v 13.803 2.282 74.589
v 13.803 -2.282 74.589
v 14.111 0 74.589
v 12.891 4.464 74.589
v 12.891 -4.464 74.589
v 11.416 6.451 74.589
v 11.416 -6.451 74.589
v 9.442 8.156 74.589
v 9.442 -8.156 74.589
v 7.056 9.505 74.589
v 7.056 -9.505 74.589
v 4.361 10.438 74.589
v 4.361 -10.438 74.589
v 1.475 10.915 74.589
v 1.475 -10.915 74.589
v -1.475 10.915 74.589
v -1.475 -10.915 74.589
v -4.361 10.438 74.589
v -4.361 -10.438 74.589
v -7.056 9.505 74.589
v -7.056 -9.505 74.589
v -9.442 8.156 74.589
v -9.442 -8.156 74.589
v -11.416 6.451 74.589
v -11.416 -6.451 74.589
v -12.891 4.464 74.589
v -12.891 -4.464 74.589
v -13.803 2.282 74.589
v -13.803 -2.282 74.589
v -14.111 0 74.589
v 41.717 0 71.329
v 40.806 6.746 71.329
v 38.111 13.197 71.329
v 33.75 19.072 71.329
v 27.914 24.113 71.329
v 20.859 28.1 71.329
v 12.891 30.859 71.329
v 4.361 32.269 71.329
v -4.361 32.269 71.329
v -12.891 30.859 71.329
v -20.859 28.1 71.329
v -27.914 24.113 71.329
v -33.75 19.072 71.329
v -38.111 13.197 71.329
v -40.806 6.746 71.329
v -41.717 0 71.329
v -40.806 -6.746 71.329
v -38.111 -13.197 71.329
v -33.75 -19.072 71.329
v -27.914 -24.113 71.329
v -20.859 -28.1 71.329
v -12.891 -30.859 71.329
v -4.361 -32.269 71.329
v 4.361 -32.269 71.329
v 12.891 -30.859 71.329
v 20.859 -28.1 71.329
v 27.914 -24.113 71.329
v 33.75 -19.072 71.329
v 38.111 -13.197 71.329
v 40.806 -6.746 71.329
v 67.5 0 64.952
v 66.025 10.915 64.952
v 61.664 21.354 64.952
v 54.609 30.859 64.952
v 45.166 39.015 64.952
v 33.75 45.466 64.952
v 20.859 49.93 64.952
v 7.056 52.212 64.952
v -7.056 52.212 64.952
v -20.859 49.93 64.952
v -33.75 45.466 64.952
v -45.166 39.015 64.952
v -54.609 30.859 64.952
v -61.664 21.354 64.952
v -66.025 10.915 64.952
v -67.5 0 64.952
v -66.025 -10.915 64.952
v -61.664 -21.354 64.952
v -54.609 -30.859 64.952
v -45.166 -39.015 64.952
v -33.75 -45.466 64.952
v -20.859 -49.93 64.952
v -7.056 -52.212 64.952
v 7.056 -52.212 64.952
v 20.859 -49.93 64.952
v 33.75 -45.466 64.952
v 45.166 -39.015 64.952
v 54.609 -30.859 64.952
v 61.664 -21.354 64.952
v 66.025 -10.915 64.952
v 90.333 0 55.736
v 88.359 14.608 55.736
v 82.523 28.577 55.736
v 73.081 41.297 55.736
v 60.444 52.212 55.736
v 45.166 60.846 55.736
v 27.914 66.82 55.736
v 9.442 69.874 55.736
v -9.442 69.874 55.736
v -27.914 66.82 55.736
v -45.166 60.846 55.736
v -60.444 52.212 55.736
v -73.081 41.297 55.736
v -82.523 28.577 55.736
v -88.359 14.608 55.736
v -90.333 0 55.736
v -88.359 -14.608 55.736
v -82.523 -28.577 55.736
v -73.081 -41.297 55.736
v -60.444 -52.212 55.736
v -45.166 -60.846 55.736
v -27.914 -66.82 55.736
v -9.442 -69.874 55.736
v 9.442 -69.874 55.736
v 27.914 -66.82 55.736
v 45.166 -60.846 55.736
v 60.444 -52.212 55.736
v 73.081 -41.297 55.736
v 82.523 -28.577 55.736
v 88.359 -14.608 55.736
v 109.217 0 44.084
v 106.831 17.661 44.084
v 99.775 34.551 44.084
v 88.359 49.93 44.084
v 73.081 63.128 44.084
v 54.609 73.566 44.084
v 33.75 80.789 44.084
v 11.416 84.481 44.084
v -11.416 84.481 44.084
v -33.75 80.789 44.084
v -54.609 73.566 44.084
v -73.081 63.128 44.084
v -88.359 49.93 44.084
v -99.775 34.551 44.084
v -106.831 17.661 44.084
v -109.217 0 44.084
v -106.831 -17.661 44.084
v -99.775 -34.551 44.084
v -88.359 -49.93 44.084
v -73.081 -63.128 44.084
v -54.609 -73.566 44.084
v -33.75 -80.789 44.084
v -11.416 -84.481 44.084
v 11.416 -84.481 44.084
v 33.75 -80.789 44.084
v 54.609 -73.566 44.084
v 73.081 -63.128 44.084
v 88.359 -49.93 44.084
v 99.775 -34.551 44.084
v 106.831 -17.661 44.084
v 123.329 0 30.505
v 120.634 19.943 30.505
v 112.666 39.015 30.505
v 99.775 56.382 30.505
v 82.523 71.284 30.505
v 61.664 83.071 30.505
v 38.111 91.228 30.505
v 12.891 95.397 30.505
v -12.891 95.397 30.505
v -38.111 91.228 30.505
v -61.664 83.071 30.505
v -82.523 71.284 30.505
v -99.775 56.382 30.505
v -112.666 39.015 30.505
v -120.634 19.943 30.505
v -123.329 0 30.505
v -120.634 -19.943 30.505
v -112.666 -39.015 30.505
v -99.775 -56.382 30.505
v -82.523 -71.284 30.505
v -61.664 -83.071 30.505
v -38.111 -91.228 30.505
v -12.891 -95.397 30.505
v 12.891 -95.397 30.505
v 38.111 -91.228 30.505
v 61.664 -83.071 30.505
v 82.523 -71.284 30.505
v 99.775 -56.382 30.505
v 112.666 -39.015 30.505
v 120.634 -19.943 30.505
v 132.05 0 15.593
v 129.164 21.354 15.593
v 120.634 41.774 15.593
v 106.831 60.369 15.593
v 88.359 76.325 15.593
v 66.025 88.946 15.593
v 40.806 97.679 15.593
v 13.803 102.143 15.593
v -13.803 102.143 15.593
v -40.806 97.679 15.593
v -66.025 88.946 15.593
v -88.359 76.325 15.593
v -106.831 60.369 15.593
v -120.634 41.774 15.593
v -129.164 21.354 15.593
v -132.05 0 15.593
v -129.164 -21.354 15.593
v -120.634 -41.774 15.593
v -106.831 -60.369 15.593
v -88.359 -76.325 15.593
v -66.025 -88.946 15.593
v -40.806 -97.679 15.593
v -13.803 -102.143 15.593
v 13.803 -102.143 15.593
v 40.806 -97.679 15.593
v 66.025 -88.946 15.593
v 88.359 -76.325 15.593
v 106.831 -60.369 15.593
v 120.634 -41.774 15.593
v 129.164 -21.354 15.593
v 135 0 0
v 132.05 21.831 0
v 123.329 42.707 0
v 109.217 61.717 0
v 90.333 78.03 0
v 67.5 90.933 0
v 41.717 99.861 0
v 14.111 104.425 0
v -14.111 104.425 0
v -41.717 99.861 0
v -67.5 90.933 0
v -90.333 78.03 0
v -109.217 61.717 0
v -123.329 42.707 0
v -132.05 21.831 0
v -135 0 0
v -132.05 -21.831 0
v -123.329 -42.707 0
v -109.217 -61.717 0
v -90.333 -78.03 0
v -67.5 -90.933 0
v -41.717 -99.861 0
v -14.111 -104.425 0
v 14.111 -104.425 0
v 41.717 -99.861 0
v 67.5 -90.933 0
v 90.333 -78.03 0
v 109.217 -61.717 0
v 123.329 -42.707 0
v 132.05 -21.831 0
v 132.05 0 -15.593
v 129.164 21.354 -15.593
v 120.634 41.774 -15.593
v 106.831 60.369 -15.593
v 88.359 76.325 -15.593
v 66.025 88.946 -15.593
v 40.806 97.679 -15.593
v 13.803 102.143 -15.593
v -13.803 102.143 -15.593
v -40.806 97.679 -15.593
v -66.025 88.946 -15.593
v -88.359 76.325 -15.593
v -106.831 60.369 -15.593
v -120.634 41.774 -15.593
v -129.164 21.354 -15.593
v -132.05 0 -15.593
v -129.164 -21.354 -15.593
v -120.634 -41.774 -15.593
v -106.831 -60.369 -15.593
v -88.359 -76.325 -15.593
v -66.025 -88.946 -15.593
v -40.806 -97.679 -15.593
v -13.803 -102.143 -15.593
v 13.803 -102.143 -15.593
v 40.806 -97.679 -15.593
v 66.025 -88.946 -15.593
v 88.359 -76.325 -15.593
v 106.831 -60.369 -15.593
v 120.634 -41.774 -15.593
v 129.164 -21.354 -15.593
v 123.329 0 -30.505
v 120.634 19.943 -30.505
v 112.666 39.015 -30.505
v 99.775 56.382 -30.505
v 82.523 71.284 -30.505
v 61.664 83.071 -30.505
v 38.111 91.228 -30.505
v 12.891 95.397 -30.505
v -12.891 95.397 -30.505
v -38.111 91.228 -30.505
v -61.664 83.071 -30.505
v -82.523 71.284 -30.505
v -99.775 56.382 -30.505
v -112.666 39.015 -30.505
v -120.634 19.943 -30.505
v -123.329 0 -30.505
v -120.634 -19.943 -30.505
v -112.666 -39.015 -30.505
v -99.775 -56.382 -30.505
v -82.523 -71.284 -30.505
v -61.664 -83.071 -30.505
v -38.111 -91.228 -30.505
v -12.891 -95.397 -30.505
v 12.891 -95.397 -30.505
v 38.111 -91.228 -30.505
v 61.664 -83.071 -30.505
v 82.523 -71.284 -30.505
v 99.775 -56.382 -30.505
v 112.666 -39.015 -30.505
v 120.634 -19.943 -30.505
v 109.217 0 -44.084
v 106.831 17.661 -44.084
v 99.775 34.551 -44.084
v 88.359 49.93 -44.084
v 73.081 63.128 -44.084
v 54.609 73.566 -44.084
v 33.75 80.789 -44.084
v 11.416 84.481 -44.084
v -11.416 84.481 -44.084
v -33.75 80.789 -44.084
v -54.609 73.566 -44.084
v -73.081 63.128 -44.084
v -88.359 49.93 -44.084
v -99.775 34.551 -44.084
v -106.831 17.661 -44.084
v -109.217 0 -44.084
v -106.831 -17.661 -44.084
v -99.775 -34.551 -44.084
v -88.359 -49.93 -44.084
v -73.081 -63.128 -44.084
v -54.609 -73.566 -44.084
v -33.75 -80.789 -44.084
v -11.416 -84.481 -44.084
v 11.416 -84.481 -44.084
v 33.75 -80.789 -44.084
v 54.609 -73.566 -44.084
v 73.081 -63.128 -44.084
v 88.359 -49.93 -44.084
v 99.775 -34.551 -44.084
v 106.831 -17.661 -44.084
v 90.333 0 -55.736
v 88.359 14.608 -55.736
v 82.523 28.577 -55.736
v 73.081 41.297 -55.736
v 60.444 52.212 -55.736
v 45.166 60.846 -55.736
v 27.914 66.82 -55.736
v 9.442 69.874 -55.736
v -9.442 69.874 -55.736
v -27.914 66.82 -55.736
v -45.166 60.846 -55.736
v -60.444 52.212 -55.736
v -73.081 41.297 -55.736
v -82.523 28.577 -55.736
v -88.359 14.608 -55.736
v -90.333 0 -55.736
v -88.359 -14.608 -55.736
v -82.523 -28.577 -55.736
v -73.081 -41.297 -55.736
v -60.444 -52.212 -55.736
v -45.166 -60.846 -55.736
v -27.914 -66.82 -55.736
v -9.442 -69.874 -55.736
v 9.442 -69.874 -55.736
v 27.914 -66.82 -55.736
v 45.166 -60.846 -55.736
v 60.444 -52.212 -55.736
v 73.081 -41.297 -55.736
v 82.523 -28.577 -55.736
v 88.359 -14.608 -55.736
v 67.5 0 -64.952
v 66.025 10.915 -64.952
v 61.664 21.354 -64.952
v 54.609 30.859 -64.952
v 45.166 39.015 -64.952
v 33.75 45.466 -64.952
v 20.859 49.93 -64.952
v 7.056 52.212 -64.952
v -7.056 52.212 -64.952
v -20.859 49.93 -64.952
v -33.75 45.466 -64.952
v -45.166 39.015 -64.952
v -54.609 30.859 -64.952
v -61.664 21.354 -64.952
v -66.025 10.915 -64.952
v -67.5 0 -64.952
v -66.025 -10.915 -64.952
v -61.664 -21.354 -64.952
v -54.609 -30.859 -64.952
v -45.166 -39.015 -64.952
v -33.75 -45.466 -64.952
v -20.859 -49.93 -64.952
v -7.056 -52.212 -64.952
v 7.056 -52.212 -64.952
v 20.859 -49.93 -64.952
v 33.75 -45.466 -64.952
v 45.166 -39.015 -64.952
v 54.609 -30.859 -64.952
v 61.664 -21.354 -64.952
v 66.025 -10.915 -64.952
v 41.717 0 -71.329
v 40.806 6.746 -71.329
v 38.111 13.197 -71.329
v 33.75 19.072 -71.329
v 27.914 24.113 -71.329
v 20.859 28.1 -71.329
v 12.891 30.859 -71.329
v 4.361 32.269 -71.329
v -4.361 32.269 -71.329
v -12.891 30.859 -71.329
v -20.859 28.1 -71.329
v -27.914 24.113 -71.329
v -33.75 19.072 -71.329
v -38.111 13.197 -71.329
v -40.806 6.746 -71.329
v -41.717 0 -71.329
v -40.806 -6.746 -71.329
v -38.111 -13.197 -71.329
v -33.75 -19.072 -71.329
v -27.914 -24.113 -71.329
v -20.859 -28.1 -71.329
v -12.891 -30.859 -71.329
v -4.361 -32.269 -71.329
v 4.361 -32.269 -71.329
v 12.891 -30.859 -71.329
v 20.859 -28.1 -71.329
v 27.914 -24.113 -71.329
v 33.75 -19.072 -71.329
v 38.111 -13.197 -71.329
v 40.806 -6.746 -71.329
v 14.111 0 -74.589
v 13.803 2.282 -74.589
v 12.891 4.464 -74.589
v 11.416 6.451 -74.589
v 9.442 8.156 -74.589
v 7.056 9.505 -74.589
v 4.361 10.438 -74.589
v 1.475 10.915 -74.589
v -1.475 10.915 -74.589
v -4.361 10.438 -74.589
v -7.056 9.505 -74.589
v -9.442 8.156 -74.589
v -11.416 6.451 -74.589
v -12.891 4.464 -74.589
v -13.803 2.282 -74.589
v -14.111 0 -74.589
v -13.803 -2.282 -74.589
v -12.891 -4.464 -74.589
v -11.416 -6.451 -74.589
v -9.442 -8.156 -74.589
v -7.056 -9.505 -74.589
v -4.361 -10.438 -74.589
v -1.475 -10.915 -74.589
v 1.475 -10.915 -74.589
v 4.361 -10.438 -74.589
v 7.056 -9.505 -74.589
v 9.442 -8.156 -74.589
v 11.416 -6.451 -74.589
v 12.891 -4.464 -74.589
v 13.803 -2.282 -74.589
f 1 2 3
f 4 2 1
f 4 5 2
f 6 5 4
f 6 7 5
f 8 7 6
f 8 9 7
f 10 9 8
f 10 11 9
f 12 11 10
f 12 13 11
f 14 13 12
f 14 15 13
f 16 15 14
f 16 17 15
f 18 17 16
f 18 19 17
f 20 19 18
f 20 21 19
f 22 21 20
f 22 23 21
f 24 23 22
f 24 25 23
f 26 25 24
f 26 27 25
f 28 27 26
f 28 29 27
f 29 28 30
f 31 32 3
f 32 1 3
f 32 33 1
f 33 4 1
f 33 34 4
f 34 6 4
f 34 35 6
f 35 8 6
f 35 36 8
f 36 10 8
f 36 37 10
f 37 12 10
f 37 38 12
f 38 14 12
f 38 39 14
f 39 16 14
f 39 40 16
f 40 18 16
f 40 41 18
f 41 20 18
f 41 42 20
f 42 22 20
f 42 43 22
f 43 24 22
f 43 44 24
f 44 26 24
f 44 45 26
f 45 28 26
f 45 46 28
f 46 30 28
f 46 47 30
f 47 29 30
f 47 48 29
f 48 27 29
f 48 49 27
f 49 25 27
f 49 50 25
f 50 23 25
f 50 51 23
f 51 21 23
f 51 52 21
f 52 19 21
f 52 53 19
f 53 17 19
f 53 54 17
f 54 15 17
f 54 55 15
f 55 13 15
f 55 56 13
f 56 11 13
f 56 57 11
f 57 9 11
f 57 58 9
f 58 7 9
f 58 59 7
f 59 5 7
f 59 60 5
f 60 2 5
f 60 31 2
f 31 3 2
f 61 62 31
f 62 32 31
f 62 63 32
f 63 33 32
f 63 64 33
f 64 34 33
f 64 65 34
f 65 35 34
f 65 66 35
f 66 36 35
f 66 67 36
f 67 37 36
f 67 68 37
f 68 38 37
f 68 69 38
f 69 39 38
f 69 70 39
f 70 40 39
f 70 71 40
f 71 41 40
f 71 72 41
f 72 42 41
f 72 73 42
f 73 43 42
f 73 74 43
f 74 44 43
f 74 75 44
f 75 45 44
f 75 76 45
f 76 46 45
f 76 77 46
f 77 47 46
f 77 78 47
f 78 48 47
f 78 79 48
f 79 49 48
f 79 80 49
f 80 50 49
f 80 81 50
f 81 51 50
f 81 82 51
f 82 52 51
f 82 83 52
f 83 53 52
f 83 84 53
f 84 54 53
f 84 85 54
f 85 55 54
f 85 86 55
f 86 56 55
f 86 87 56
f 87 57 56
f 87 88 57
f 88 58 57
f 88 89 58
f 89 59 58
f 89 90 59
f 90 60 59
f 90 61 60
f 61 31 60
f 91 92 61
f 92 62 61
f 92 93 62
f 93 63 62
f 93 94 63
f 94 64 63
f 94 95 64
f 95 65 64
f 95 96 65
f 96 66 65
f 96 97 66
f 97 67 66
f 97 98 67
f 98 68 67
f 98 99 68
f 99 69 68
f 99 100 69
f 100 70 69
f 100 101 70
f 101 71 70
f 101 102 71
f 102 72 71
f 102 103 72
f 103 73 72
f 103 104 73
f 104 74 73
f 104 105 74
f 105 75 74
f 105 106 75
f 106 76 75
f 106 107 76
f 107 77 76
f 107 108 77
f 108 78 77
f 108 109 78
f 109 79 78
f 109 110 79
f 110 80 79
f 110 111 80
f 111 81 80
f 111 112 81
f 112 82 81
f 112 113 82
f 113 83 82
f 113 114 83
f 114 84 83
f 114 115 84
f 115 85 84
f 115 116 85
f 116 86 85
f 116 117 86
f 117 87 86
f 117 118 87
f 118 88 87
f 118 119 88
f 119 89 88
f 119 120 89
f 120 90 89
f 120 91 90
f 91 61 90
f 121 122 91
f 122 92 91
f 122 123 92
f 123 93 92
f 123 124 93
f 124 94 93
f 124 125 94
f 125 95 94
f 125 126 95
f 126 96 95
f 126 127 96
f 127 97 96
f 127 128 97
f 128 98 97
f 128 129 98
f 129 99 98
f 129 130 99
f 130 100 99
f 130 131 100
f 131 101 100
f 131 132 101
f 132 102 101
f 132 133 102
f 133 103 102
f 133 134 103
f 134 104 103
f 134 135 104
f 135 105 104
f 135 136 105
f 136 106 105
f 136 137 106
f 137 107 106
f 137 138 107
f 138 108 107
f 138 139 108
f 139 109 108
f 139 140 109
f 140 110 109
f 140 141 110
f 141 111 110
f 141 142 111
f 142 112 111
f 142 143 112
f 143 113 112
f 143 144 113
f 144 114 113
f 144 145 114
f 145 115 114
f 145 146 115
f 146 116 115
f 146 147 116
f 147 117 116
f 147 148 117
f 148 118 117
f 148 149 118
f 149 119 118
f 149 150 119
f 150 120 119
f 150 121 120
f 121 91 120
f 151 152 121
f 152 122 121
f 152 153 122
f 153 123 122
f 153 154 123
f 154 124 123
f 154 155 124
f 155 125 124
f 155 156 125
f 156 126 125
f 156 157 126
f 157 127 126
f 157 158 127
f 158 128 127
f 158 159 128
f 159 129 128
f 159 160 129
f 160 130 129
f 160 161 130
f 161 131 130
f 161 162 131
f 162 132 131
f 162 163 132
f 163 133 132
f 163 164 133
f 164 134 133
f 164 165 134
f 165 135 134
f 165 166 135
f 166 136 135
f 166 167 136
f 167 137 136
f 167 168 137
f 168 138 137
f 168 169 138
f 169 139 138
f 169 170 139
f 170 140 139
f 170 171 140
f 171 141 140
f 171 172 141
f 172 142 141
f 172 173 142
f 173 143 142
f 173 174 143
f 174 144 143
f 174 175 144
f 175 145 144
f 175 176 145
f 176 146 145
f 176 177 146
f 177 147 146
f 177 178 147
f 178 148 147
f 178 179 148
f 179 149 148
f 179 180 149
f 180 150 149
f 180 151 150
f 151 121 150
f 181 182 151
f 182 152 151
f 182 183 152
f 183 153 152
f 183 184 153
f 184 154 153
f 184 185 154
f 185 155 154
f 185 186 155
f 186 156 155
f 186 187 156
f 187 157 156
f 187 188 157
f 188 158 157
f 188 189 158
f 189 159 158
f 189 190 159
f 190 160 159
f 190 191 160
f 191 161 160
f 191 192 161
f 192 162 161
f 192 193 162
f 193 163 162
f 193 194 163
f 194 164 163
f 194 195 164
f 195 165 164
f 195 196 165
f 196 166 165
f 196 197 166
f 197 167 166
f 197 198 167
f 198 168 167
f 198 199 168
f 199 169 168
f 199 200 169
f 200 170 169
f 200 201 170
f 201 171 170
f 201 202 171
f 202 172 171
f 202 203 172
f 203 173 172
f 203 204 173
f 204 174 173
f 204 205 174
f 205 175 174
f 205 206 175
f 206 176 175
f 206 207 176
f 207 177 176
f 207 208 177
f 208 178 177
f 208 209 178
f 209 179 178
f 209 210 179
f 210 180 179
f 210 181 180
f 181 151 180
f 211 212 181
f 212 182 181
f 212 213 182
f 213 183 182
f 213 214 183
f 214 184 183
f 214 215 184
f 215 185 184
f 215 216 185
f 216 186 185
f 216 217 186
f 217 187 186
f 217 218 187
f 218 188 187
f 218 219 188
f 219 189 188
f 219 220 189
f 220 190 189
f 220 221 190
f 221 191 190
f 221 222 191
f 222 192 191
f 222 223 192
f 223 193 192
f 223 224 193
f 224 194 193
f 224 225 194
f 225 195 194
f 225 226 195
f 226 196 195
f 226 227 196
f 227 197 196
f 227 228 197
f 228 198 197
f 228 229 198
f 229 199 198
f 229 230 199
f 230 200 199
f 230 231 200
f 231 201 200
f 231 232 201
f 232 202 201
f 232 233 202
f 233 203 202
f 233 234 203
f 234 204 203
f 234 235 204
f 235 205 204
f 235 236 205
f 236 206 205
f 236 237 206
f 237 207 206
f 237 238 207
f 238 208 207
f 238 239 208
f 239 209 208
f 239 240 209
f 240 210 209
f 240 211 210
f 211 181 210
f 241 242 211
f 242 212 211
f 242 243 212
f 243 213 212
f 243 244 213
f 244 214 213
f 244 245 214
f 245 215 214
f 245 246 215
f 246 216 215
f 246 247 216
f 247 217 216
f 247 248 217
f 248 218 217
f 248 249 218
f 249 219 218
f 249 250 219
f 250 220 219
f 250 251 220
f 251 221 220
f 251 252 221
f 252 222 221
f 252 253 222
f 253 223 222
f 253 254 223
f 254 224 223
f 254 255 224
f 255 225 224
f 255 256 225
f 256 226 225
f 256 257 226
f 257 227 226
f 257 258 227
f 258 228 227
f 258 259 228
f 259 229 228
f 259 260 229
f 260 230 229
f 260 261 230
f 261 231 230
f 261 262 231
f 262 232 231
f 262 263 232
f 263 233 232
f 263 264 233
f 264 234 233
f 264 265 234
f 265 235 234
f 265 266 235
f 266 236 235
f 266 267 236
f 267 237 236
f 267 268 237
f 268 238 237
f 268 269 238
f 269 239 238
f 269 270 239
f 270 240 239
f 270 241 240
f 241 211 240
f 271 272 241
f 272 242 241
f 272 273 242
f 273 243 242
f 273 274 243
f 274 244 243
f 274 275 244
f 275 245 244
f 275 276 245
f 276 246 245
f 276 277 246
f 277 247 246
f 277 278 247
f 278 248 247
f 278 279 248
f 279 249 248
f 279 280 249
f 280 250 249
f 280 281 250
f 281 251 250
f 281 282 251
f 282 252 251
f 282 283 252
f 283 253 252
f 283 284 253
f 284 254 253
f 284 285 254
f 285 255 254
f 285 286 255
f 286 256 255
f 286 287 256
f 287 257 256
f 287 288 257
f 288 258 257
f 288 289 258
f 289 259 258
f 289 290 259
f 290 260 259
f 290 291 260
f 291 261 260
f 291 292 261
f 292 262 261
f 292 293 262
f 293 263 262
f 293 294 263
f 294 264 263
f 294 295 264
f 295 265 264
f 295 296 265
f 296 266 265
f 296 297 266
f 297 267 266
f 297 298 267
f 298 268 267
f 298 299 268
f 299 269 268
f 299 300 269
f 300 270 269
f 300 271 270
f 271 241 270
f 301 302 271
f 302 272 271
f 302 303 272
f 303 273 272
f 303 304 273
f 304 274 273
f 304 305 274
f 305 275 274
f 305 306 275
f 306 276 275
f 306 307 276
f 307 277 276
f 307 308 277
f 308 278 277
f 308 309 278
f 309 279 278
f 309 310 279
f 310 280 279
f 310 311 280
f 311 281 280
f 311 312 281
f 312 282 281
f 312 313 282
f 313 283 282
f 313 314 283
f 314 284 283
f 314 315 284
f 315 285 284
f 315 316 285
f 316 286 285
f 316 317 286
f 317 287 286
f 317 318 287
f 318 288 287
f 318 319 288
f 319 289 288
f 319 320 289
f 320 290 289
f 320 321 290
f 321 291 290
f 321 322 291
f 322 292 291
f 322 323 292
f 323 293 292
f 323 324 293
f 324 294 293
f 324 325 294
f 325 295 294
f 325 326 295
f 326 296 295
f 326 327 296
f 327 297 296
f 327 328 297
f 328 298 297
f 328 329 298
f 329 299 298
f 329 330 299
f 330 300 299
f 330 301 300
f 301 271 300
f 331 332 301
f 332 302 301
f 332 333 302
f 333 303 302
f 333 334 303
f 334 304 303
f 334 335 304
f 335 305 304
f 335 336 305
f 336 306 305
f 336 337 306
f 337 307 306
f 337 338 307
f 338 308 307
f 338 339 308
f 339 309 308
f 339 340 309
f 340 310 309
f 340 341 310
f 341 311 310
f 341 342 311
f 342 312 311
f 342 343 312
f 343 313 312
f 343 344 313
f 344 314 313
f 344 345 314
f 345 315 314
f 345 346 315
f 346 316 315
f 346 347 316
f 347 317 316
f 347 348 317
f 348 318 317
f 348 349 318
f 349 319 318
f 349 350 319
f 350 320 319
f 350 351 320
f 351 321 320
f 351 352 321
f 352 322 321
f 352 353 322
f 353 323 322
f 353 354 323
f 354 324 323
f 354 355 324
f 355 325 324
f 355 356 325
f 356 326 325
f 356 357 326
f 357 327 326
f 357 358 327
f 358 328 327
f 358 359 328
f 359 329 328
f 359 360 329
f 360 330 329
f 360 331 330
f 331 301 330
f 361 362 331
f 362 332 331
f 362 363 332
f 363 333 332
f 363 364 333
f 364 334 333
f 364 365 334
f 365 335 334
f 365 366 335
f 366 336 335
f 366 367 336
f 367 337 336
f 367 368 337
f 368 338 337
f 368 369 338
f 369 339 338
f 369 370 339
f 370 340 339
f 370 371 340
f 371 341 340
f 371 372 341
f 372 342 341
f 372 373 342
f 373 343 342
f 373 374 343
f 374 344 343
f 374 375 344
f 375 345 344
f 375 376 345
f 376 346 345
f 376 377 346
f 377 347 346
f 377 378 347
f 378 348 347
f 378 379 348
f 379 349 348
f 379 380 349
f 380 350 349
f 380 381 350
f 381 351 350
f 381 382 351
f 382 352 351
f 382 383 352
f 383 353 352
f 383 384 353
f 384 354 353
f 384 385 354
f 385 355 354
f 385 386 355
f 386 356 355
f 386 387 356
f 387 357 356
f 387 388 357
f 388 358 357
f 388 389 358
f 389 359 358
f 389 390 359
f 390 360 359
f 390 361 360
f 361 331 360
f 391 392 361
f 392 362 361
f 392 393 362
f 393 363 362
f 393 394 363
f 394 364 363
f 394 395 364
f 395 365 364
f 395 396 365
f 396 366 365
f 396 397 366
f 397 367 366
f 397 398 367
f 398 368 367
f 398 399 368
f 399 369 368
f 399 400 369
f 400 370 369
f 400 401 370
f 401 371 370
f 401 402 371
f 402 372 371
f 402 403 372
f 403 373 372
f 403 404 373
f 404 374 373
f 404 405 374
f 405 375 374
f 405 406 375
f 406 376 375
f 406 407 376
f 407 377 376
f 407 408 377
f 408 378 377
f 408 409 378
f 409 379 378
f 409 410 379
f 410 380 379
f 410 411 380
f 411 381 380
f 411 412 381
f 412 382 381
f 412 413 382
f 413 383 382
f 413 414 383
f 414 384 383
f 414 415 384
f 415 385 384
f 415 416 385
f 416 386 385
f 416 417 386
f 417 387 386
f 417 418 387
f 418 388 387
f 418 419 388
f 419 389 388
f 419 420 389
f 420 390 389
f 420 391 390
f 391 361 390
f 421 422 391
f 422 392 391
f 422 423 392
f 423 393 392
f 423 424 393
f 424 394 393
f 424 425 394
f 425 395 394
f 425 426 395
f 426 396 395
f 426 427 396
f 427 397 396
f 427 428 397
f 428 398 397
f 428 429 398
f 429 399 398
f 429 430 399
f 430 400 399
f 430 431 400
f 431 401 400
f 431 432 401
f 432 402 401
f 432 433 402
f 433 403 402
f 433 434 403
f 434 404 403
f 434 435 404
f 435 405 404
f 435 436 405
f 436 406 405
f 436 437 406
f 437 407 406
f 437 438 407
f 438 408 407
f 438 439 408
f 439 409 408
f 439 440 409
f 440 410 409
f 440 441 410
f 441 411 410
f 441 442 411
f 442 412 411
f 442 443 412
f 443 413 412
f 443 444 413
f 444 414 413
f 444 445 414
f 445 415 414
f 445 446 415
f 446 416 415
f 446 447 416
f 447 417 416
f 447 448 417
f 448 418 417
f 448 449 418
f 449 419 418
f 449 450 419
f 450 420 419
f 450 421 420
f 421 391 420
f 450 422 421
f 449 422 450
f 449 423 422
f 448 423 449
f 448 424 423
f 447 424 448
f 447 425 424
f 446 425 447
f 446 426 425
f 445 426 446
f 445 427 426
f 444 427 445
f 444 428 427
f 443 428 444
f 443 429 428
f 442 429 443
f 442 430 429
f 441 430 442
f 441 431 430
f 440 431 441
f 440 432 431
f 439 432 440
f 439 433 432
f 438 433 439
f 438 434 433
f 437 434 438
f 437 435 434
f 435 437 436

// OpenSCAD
// Generated by SolidPython 1.0.1 on 2020-07-29 00:46:48


scale(v = [9, 7, 5]) {
	sphere(r = 15);
}
/***********************************************
*********      SolidPython code:      **********
************************************************
 
# import packages: SolidPython
from solid import *
from solid.utils import *
from itertools import chain, combinations, permutations


class Resize:

    def __init__(self, scad_file):
        self.scad_file = scad_file
        #self.scad_file = import_scad(scad_file)
        # cone/cylinder param:
        self.r1 = 0
        self.r2 = 0
        self.h = 0
        # rectangular prism param:
        self.w = 0
        self.l = 0
        # ellipse param:
        self.r = 0

    # import OpenScad code (file name corresponds to shape)


    # classify shape + parameters
    def assign(self, param1, param2, param3):
        if self.scad_file == 'cone.scad':
            self.r1 = param1
            self.r2 = param2
            self.h = param3
        elif self.scad_file == 'cylinder.scad':
            self.r1 = param1
            self.r2 = param2
            self.h = param3
        elif self.scad_file == 'rectangularPrism.scad':
            self.h = param1
            self.l = param2
            self.w = param3
        else:
            self.r = param1
            self.h = param2

    # resize parameters
    def iterate(self):
        x = range(3, 20, 2)
        i = 1
        if self.scad_file == 'cone.scad':
            tempList = list(permutations(x, 2))
            for temp in tempList:
                param1 = temp[0]
                param2 = temp[1]
                filepath = 'produced_scad_files/' + 'cone' + str(param1) + '_' + str(param2) + '_' + '.scad'
                scad_render_to_file(cylinder(h=param1, r1=param2, r2=0), filepath)

        elif self.scad_file == 'cylinder.scad':
            tempList = list(permutations(x, 3))
            for temp in tempList:
                param1 = temp[0]
                param2 = temp[1]
                filepath = 'produced_scad_files/' + 'cylinder' + str(param1) + '_' + str(param2) + '_' + '.scad'
                scad_render_to_file(cylinder(h=param1, r1=param2, r2=param2), filepath)

        elif self.scad_file == 'rectangularPrism.scad':
            tempList = list(permutations(x, 3))
            for temp in tempList:
                param1 = temp[0]
                param2 = temp[1]
                param3 = temp[2]
                filepath = 'produced_scad_files/' + 'rectangularPrism' + str(param1) + '_' + str(param2) + '_' + str(
                    param3) + '.scad'
                scad_render_to_file(cube(size=(param1, param2, param3)), filepath)

        elif self.scad_file == 'ellipse.scad':
            tempList = list(permutations(x, 4))
            for temp in tempList:
                param1 = temp[0]
                param2 = temp[1]
                param3 = temp[2]
                param4 = temp[3]
                filepath = 'produced_scad_files/' + 'ellipse' + str(param1) + '_' + str(param2) + '_' + str(param3) + '_' + str(param4) + '.scad'
                scad_render_to_file(scale([param1, param2, param3])(sphere(r=param4)), filepath)

    def render_to_scadfile(self):
        scad_render_to_file(scad, 'example.scad') 
 
************************************************/
